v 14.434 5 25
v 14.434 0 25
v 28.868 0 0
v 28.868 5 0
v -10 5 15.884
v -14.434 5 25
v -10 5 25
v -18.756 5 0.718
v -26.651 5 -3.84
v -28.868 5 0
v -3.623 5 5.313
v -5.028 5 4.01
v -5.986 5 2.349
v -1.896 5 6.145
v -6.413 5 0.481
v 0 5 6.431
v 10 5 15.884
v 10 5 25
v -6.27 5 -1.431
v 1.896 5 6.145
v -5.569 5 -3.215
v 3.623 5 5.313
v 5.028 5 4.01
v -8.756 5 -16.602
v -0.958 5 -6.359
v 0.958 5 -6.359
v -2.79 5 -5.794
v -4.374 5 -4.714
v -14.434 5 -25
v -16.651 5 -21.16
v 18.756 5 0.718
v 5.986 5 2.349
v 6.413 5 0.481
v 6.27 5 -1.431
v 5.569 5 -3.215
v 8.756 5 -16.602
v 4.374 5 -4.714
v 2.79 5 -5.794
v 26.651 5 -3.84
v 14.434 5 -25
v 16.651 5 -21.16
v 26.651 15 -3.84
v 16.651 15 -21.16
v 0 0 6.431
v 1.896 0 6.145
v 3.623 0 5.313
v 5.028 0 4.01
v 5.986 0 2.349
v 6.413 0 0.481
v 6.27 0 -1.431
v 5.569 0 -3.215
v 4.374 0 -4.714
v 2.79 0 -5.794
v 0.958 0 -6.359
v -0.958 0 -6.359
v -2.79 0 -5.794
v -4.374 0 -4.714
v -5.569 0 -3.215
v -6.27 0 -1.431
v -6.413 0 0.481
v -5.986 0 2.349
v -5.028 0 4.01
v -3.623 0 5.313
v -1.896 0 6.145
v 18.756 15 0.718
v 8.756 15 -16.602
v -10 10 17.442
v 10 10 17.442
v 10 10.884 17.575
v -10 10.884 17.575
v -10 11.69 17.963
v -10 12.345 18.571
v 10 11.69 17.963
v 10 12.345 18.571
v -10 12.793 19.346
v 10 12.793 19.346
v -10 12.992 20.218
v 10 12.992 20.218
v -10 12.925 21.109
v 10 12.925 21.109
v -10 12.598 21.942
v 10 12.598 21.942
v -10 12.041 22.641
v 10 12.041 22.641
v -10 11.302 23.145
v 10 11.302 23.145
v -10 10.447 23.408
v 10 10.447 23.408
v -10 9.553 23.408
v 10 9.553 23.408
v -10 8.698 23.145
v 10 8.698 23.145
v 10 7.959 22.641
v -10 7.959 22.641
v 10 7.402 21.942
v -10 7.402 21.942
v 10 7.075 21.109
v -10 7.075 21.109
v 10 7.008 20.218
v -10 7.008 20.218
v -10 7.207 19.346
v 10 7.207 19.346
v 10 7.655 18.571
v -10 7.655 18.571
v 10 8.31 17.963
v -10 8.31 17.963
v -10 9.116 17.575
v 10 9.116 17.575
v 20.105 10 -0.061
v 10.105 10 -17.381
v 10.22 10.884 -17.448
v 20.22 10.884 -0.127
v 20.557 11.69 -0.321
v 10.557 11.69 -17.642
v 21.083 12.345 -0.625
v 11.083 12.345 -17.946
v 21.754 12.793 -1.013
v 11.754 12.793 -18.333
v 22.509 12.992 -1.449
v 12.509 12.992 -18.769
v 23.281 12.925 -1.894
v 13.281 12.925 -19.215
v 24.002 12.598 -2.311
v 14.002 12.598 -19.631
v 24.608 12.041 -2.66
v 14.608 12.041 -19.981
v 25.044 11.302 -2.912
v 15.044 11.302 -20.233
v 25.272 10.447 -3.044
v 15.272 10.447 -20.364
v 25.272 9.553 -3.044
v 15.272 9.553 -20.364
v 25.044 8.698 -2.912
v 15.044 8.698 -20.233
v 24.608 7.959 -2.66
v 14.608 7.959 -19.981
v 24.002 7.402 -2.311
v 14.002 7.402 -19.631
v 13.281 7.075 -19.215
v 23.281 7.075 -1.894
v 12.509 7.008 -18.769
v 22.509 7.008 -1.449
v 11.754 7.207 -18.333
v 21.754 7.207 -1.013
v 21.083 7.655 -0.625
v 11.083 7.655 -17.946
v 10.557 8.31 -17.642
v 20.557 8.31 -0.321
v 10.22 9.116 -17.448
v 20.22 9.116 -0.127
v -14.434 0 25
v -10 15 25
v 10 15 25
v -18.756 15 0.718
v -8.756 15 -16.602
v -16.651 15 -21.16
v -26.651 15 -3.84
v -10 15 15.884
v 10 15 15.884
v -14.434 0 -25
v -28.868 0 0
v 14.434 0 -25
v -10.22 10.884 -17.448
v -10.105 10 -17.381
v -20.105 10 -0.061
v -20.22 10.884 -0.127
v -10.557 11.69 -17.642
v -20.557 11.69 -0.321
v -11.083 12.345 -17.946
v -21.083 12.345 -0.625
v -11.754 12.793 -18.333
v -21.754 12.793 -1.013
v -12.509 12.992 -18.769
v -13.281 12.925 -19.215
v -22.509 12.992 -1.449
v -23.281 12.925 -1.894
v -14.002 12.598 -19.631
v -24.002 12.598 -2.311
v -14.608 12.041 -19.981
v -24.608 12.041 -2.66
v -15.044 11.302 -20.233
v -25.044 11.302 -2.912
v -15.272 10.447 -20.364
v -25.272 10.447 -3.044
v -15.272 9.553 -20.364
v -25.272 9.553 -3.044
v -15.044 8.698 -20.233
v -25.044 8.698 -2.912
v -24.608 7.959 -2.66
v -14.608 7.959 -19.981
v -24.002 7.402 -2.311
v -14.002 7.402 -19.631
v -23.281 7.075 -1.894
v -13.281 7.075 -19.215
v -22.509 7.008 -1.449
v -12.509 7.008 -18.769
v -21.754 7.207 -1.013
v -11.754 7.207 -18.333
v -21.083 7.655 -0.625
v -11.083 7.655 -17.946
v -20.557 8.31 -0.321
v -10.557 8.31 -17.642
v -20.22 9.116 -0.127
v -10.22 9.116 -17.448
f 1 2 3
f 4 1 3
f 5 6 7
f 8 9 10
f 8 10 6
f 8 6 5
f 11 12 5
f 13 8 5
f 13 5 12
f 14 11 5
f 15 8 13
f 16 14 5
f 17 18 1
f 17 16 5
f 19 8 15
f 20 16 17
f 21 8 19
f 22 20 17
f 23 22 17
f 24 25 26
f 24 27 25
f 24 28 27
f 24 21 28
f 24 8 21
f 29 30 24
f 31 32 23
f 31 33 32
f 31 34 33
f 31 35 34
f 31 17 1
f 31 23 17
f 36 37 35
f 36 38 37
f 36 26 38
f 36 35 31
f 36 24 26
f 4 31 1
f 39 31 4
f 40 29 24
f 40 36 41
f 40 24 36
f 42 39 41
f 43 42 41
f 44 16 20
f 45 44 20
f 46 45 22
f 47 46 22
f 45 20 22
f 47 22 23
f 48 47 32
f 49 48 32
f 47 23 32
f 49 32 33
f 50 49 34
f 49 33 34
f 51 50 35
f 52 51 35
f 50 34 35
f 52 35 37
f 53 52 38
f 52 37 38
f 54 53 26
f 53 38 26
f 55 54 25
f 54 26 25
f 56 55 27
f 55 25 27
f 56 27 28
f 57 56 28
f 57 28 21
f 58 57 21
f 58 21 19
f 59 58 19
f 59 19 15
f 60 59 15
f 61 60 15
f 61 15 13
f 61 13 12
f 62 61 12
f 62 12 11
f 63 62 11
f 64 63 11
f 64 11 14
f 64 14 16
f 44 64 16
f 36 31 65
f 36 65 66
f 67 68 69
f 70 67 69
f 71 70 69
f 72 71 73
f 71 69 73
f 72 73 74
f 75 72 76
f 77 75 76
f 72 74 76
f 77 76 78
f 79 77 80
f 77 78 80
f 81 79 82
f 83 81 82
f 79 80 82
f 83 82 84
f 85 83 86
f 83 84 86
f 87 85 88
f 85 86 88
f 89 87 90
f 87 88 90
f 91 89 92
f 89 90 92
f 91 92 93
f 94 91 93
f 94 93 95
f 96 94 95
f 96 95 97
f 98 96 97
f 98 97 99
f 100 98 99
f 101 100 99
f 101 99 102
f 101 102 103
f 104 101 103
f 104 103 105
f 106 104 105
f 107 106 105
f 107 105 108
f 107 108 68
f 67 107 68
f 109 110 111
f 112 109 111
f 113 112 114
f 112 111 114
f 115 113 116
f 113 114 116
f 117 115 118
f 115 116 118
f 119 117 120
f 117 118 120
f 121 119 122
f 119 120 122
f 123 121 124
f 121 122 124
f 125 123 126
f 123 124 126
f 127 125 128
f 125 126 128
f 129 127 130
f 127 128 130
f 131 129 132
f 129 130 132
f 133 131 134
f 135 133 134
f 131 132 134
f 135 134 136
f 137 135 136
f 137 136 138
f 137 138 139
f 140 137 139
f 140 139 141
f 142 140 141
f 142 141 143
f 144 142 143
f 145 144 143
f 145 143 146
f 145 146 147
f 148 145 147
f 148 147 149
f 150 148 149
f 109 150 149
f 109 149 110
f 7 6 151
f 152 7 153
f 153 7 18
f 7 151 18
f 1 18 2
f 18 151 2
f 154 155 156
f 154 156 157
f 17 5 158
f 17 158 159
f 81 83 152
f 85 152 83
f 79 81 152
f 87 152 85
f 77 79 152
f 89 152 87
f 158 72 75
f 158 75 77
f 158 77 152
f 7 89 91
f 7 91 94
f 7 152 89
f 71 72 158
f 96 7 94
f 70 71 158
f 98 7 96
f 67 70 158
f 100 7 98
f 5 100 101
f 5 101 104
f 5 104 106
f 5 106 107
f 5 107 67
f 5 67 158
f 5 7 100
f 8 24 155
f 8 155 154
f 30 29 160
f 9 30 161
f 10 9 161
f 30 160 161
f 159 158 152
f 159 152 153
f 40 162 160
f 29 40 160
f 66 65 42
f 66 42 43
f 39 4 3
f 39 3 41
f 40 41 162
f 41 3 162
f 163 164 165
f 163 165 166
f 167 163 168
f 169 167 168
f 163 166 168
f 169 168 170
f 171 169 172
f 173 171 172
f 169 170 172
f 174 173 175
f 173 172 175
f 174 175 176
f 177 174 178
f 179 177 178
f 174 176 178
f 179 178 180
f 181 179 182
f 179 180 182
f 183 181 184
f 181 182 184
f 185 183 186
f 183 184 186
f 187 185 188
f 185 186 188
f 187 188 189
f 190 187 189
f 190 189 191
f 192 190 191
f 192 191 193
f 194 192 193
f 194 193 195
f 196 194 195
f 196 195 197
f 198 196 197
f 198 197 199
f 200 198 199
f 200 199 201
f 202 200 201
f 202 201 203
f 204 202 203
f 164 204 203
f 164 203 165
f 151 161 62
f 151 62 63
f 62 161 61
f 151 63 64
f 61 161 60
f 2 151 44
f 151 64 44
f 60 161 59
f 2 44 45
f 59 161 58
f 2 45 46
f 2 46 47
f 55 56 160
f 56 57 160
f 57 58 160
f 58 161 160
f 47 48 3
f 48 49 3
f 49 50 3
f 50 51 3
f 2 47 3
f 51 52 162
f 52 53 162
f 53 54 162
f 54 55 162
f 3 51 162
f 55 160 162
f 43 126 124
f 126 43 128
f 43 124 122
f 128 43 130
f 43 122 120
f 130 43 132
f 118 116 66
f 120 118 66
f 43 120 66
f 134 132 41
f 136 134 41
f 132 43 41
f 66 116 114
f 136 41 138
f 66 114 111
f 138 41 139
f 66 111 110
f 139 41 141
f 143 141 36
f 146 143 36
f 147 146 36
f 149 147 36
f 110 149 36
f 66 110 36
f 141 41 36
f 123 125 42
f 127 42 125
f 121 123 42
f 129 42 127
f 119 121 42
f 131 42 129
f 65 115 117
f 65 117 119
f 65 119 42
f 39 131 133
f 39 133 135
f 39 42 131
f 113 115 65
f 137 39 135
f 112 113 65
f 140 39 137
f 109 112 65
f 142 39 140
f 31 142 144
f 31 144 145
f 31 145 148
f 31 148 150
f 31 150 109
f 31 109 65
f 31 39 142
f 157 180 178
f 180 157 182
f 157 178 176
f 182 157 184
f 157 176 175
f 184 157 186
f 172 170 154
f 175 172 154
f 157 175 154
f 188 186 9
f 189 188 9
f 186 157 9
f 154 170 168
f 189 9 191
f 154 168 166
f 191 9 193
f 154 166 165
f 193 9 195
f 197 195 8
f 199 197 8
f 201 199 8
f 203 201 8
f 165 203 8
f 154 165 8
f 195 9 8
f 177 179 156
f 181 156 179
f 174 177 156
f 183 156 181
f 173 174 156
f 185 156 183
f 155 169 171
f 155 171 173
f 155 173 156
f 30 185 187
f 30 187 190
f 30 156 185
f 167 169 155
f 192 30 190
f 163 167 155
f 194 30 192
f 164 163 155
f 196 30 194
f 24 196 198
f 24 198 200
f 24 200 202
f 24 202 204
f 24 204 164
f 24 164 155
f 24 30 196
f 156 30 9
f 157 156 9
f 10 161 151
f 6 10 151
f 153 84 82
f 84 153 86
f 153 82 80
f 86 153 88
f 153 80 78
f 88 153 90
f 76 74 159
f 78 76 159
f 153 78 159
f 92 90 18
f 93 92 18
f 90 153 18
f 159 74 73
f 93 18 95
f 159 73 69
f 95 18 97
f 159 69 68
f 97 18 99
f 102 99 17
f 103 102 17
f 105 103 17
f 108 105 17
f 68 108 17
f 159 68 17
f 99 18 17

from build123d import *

# Parameters (mm, degrees)
BOSS_EXTRUDE1_DEPTH = 5
SKETCH4_R           = 6.430810597
CUT_EXTRUDE2_DEPTH  = 10
SKETCH2_W           = 20
SKETCH2_H           = 9.116342764
BOSS_EXTRUDE2_DEPTH = 10
SKETCH3_R           = 3
CUT_EXTRUDE1_DEPTH  = 49.586866564
CIRPATTERN1_COUNT   = 3


with BuildPart() as part:
    # Sketch1 → Boss-Extrude1 (new body)
    with BuildSketch(Plane(origin=(0, 0, 0), x_dir=(1, 0, 0), z_dir=(0, 1, 0))):
        Polygon((14.43375673, 25), (-14.43375673, 25), (-28.867513459, 0), (-14.43375673, -25), (14.43375673, -25), (28.867513459, 0), align=None)
    extrude(amount=BOSS_EXTRUDE1_DEPTH)

    # Sketch4 → Cut-Extrude2 (cut)
    with BuildSketch(Plane(origin=(0, 5, 0), x_dir=(1, 0, 0), z_dir=(0, 1, 0))):
        with Locations(Location((0, 0, 0), (0, 0, 270))):
            Circle(SKETCH4_R)
    extrude(amount=-CUT_EXTRUDE2_DEPTH, mode=Mode.SUBTRACT)

    # Sketch2 → Boss-Extrude2 (add)
    with BuildSketch(Plane(origin=(0, 5, 0), x_dir=(1, 0, 0), z_dir=(0, 1, 0))):
        with Locations((0, -20.441828618)):
            Rectangle(SKETCH2_W, SKETCH2_H)
    boss_extrude2 = extrude(amount=BOSS_EXTRUDE2_DEPTH)

    # Sketch3 → Cut-Extrude1 (cut, through all)
    with BuildSketch(Plane(origin=(10, 0, 0), x_dir=(0, 0, -1), z_dir=(1, 0, 0))):
        with Locations((-20.441828618, 10)):
            Circle(SKETCH3_R)
    cut_extrude1 = extrude(amount=-CUT_EXTRUDE1_DEPTH, mode=Mode.SUBTRACT)

    # CirPattern1: Boss-Extrude2, Cut-Extrude1 ×3 about axis
    cirpattern1_axis = Axis((0, 0, 0), (0, 1, 0))
    add([boss_extrude2.rotate(cirpattern1_axis, i * 360 / CIRPATTERN1_COUNT) for i in range(1, CIRPATTERN1_COUNT)])
    add([cut_extrude1.rotate(cirpattern1_axis, i * 360 / CIRPATTERN1_COUNT) for i in range(1, CIRPATTERN1_COUNT)], mode=Mode.SUBTRACT)


solid = part.part
